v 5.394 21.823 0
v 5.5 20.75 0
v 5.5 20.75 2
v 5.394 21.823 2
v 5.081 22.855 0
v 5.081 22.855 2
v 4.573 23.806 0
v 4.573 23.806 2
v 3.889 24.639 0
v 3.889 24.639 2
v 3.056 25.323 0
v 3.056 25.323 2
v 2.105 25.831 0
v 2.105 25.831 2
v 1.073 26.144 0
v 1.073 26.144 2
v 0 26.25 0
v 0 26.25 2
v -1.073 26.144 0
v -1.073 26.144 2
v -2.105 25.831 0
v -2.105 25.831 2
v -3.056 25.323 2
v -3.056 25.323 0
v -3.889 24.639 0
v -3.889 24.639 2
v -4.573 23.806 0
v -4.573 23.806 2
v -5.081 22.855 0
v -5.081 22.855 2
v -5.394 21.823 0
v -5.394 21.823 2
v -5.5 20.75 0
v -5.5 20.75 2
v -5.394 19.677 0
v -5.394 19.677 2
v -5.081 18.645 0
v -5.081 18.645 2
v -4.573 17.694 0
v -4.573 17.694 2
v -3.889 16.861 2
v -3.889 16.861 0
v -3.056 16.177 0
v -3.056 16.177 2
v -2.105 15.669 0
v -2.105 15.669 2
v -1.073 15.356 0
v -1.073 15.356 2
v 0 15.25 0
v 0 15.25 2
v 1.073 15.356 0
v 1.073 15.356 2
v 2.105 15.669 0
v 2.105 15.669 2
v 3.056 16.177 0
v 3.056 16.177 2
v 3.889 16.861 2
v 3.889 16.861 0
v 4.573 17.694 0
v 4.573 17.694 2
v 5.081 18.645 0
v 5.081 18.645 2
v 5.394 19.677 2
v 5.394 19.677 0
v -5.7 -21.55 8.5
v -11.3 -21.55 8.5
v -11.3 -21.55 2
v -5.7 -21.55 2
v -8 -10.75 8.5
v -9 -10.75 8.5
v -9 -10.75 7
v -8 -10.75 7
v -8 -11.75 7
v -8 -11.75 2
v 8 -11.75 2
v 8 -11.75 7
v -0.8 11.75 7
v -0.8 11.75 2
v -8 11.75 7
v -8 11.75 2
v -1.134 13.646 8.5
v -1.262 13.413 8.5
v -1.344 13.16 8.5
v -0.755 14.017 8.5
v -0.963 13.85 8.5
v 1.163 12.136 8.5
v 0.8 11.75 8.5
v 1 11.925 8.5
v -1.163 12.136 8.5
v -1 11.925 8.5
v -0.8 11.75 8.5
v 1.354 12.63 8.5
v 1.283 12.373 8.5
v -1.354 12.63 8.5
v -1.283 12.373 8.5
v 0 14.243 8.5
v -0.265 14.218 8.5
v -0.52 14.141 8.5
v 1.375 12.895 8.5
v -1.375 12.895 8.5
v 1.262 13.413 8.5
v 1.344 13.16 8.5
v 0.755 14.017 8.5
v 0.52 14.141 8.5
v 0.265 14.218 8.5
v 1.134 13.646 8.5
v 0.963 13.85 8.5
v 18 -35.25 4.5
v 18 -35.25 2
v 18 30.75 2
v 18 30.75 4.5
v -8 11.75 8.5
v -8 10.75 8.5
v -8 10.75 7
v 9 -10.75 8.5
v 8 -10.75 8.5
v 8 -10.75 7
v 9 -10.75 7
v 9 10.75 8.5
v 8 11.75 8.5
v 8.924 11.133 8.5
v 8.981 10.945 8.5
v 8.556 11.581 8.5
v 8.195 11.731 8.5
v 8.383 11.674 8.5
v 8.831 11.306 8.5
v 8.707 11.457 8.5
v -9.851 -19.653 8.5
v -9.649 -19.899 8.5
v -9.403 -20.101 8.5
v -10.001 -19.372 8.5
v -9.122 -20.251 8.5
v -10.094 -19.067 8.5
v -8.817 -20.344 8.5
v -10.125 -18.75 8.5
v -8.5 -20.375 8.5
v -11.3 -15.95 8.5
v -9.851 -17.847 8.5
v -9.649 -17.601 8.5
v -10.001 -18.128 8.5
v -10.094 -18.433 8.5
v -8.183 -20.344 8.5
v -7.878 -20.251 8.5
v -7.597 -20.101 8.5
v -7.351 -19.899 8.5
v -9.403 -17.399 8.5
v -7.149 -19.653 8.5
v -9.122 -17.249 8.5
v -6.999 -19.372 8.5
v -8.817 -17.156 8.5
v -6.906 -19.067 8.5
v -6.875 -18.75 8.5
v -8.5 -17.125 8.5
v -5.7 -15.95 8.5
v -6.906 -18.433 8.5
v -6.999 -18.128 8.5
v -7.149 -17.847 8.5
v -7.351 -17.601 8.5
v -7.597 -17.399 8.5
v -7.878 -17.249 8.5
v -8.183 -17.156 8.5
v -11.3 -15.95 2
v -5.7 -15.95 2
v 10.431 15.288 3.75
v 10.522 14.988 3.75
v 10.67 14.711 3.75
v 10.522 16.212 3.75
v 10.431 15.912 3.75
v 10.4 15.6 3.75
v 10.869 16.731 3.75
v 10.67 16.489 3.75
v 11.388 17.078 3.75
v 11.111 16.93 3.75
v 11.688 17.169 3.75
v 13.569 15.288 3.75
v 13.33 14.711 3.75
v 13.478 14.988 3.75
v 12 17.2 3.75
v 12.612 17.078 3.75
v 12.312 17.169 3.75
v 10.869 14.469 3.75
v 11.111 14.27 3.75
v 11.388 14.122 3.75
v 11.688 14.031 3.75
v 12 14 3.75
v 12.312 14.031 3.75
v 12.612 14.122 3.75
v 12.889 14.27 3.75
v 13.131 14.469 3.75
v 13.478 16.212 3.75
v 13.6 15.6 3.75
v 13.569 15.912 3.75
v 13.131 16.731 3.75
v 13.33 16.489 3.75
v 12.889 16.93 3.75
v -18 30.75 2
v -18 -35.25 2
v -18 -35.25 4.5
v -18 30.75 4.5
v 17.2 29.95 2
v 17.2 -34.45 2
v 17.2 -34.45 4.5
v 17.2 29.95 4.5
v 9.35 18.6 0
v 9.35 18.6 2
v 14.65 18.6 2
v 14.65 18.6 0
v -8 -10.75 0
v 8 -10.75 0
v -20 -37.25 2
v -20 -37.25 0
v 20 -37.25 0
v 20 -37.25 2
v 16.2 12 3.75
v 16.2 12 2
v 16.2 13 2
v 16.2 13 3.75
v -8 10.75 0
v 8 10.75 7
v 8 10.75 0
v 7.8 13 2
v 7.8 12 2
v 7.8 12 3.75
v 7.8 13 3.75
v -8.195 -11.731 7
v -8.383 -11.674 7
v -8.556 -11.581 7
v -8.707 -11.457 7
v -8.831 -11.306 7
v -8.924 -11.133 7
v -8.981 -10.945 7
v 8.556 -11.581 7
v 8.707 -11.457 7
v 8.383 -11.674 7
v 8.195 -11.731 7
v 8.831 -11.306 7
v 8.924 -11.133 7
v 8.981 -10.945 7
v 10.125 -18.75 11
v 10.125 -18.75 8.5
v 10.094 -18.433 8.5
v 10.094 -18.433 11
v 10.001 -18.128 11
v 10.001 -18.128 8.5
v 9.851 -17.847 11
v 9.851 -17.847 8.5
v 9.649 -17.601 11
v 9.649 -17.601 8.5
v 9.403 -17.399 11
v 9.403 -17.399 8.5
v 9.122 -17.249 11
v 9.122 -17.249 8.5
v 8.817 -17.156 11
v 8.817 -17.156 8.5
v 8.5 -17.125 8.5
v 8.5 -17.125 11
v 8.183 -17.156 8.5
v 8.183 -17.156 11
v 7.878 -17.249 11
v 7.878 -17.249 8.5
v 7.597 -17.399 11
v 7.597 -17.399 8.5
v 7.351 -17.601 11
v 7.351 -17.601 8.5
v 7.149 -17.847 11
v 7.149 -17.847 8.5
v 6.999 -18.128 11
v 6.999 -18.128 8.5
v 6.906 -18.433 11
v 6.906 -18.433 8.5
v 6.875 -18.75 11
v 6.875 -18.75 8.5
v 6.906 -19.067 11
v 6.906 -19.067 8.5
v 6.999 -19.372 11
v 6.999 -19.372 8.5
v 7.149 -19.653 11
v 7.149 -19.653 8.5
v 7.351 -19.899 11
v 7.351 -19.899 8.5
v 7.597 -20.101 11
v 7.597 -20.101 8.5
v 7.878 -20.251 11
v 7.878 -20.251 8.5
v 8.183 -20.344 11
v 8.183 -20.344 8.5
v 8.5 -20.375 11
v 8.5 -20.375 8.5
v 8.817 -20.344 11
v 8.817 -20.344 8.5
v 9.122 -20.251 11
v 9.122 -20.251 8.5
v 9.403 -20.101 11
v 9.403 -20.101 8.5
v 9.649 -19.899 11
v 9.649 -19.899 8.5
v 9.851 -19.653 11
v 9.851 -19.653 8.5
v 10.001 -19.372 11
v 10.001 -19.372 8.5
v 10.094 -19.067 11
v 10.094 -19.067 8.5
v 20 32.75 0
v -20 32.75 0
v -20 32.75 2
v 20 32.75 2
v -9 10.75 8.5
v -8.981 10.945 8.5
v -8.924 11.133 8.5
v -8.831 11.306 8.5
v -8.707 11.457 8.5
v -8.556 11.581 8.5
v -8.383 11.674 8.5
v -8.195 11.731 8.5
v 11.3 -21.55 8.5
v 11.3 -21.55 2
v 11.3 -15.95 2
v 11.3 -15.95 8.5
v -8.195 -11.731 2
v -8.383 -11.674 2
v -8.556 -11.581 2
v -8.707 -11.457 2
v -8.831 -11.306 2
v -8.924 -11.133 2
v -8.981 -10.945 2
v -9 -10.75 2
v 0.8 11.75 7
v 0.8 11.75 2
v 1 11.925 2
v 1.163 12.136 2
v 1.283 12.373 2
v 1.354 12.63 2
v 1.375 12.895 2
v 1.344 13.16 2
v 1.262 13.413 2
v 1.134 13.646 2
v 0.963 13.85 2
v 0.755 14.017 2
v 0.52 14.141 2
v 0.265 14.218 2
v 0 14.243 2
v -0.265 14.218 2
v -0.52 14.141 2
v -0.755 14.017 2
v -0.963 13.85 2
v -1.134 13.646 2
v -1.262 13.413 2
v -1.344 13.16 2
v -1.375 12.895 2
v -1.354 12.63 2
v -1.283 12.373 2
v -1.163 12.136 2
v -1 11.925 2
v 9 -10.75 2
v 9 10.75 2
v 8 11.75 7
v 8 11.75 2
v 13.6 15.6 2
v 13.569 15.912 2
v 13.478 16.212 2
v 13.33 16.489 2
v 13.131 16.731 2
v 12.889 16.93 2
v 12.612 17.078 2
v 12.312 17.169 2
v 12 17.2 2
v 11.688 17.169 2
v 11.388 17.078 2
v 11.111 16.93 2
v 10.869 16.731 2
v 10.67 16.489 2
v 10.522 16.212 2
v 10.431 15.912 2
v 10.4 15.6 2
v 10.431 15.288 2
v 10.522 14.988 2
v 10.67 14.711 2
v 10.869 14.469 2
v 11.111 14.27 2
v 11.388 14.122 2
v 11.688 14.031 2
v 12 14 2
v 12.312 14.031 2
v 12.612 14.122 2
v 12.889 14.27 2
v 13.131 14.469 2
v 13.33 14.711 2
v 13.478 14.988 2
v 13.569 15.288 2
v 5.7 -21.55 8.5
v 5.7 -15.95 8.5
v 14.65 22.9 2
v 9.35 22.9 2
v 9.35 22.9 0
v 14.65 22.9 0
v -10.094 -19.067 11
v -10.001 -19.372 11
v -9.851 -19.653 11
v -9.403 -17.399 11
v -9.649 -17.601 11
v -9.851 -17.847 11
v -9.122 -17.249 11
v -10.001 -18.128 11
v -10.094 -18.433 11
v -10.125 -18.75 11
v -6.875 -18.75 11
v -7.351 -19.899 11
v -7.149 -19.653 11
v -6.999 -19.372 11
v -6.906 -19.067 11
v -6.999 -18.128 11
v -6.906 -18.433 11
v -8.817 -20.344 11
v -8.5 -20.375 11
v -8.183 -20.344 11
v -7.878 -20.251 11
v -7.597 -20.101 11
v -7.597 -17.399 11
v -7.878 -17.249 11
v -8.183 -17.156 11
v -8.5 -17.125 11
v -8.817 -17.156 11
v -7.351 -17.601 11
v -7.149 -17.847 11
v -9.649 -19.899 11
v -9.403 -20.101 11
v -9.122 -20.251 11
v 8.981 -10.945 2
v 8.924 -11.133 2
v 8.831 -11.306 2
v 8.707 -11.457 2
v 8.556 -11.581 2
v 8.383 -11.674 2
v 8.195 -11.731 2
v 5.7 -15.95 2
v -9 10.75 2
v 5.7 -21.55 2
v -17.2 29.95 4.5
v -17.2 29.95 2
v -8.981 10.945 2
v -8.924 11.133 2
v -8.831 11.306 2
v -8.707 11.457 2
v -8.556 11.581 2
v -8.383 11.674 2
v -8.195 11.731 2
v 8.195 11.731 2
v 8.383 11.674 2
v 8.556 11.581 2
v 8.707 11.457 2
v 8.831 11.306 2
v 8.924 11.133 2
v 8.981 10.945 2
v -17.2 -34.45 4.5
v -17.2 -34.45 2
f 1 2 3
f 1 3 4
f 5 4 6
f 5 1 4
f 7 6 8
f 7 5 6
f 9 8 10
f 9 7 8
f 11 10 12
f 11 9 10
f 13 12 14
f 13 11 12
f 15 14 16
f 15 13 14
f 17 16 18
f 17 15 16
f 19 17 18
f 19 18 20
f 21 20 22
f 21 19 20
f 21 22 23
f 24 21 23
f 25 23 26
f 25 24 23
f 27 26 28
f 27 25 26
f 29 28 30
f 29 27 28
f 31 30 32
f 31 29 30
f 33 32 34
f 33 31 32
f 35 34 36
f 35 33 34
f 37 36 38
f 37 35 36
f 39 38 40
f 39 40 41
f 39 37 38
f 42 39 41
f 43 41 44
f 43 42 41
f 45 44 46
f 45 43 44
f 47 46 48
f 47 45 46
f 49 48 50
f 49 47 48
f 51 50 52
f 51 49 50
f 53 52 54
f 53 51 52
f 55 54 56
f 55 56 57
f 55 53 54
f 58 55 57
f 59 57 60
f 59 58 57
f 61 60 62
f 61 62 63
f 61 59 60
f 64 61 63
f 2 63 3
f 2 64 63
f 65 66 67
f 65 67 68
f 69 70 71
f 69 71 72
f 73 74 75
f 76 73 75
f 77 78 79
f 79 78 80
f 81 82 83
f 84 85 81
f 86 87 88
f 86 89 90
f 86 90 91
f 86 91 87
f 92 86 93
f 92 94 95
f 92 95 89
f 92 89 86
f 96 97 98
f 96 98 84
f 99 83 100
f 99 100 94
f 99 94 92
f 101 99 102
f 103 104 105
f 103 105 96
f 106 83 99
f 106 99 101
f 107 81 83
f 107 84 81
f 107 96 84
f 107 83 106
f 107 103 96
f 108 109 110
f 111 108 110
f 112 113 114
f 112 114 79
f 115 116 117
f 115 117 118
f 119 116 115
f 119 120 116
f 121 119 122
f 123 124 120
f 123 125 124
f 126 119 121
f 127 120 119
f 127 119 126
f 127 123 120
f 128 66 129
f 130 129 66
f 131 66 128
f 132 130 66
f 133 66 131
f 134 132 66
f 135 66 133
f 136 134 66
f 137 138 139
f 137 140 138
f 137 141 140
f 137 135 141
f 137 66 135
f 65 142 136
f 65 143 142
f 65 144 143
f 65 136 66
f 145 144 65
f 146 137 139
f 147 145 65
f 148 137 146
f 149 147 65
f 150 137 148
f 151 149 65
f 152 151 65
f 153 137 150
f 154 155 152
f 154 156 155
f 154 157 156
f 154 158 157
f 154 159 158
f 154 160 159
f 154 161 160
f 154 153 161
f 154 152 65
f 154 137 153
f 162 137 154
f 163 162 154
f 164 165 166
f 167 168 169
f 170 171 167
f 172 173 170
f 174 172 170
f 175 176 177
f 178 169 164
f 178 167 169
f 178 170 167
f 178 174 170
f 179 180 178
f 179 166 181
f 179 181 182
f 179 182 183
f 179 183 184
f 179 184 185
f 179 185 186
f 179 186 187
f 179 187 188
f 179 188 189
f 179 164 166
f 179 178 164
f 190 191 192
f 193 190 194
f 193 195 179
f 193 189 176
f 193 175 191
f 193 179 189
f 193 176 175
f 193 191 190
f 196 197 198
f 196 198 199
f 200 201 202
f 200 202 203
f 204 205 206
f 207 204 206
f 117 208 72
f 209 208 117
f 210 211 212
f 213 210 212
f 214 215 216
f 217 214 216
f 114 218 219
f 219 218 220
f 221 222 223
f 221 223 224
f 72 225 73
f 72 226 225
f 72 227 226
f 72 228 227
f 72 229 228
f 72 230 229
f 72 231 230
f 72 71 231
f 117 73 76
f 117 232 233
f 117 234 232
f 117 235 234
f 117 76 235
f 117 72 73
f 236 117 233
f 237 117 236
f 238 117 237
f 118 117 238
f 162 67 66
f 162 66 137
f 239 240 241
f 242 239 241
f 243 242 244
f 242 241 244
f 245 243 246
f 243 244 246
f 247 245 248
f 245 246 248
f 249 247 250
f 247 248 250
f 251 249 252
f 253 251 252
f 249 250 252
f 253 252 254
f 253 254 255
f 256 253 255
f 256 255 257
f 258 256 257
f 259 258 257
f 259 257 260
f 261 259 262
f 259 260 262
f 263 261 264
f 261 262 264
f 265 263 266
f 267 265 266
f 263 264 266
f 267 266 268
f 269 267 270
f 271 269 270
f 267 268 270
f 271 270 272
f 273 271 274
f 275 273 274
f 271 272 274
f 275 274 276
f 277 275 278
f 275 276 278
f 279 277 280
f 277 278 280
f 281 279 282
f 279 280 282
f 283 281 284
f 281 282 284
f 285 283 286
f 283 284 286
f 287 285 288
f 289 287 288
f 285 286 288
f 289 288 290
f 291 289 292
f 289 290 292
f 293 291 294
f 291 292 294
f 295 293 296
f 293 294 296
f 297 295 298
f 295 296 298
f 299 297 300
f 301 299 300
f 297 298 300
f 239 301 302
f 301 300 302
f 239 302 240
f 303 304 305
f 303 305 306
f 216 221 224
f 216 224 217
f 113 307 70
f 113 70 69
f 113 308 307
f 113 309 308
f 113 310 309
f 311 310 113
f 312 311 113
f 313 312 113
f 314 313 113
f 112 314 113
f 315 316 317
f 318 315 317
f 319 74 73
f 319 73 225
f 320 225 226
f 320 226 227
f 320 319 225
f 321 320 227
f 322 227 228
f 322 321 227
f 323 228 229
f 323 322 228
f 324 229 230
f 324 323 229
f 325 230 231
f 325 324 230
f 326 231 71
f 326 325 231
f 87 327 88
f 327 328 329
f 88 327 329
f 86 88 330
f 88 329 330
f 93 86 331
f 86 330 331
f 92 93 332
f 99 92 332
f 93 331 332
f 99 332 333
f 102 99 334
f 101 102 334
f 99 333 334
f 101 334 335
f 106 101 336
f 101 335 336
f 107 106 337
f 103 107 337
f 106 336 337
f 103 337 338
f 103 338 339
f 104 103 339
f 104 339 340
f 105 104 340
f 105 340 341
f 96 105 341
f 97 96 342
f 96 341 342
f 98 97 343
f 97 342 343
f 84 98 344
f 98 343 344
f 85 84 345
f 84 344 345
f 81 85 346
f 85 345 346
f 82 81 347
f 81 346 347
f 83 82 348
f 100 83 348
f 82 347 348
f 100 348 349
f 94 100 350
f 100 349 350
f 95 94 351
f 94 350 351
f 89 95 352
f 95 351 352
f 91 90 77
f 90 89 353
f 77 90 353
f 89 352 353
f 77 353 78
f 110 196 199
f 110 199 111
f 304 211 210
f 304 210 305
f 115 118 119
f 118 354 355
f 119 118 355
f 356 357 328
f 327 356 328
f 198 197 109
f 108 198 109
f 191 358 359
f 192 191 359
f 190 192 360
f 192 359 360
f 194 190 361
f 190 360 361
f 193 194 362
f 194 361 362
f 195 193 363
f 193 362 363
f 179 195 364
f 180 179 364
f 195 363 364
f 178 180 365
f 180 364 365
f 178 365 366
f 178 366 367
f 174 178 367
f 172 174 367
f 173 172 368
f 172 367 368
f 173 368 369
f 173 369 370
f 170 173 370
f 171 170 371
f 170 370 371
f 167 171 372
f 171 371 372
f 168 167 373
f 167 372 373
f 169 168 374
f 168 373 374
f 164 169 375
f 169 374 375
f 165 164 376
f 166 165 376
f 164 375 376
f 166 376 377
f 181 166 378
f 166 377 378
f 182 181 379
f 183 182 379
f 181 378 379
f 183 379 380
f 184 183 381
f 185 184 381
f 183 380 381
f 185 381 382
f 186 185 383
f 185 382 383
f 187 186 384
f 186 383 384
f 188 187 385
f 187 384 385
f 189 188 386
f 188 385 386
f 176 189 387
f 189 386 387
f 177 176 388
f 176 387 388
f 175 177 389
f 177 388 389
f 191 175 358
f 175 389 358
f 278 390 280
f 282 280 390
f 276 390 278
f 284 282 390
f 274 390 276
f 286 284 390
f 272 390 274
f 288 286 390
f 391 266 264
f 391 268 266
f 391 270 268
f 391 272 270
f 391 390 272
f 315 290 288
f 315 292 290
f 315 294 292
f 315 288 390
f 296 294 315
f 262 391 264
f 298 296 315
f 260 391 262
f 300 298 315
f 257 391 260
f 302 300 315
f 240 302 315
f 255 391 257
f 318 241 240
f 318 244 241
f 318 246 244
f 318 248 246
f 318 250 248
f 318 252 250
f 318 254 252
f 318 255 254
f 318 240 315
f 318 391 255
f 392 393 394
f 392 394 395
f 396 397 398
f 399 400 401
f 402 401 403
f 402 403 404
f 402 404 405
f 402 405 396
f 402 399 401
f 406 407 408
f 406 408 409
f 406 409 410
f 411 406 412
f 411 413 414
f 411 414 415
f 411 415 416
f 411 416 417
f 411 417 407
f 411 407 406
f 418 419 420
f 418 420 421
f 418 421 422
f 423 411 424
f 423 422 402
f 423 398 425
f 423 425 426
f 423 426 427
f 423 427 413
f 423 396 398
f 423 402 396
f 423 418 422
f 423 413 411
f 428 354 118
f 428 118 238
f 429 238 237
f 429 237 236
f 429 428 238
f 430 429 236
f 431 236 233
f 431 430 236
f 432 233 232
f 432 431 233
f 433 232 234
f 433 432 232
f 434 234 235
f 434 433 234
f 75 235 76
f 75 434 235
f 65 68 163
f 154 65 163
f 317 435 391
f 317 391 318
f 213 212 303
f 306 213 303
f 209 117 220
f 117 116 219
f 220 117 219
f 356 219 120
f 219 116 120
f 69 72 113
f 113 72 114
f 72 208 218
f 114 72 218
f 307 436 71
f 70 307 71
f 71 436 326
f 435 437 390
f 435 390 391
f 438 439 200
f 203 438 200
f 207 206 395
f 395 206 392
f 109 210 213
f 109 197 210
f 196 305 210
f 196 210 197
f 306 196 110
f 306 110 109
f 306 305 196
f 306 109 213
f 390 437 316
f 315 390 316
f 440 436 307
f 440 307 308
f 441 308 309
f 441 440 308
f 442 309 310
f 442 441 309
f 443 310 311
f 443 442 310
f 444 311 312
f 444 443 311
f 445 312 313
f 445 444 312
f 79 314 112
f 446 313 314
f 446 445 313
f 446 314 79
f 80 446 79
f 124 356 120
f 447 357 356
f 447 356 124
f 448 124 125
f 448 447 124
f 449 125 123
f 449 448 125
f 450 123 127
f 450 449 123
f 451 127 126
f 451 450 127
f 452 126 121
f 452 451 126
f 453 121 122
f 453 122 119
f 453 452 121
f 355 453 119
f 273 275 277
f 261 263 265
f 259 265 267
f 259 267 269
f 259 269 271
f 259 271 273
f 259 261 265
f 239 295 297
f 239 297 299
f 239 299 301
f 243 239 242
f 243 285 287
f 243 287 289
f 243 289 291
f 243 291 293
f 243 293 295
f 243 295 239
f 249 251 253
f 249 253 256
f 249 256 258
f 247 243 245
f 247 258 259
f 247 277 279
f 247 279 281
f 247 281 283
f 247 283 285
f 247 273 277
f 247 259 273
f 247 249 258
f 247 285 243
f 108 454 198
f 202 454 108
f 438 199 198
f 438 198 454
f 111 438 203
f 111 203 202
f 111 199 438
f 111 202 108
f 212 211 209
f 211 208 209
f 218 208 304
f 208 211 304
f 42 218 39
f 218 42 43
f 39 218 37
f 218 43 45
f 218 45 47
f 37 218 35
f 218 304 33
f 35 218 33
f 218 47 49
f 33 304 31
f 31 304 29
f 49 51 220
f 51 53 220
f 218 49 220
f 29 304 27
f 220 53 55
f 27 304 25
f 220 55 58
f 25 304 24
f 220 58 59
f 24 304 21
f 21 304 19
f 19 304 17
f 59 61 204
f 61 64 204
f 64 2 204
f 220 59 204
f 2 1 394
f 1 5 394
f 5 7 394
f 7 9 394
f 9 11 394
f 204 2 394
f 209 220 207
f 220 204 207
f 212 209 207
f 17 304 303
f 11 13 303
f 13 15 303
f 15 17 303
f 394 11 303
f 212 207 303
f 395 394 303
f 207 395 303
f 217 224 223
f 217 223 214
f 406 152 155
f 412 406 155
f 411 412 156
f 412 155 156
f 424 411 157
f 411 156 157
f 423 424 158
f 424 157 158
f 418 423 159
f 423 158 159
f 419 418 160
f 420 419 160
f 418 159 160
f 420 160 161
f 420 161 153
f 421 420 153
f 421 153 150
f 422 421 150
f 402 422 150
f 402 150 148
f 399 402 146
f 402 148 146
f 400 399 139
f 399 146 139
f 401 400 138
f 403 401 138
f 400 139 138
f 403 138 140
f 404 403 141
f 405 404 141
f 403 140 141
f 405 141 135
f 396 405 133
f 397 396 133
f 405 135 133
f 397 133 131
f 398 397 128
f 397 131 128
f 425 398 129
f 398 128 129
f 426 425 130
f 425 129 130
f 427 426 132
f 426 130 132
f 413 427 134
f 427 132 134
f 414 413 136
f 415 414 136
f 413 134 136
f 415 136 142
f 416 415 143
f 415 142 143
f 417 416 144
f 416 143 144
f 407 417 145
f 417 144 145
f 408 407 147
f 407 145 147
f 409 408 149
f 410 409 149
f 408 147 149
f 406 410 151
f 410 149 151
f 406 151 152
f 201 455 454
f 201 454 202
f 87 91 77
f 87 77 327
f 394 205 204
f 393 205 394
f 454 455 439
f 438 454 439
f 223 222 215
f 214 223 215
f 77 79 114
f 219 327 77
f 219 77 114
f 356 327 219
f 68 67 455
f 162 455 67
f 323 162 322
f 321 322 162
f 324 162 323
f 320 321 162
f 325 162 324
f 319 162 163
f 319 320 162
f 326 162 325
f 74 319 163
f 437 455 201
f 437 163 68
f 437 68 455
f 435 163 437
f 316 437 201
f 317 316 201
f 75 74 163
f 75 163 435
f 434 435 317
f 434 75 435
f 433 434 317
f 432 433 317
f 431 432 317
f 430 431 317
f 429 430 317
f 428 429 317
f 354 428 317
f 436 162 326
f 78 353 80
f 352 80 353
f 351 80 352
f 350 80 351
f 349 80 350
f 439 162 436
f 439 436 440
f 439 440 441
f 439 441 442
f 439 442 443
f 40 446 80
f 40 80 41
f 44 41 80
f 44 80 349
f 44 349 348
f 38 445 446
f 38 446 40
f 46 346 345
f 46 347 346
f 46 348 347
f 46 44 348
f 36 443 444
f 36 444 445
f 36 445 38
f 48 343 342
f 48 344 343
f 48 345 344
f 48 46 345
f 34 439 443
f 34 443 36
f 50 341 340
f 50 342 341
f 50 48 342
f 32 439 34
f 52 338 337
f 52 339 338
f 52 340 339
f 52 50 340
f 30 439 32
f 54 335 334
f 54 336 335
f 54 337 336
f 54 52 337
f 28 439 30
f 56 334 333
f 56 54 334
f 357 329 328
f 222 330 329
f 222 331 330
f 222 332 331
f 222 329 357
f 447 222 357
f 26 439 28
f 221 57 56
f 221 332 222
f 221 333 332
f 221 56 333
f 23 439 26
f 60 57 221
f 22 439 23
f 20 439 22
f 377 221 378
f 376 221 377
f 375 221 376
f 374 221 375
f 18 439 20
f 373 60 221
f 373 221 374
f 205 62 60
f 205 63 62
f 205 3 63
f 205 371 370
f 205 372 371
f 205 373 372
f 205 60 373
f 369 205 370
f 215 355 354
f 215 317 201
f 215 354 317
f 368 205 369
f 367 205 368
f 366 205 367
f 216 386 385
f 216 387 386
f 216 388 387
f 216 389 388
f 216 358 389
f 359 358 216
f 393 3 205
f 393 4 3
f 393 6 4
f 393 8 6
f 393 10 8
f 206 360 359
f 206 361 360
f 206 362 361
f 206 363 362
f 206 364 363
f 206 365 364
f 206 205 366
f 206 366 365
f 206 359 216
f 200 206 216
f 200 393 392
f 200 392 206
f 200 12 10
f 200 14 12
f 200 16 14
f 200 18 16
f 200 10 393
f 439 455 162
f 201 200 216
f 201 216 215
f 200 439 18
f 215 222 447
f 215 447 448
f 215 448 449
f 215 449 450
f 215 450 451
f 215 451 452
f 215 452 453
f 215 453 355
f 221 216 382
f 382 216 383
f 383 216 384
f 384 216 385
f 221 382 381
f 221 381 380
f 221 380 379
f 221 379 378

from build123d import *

# Parameters (mm, degrees)
SKETCH_W        = 40
SKETCH_H        = 70
SKETCH_R        = 5.5
SKETCH_W_2      = 16
SKETCH_H_2      = 21.5
PAD_DEPTH       = 2
SKETCH001_W     = 5.6
SKETCH001_H     = 5.6
SKETCH001_W_2   = 16
SKETCH001_H_2   = 21.5
PAD001_DEPTH    = 6.5
SKETCH002_R     = 1.625
PAD002_DEPTH    = 2.5
SKETCH003_W     = 16.000008
SKETCH003_H     = 1
SKETCH003_W_2   = 18
POCKET_DEPTH    = 1.5
SKETCH004_W     = 5.3
SKETCH004_H     = 4.3
POCKET001_DEPTH = 2.001
SKETCH005_R     = 1.6
SKETCH005_W     = 8.4
SKETCH005_H     = 1
PAD003_DEPTH    = 1.75
SKETCH006_W     = 36
SKETCH006_H     = 66
SKETCH006_W_2   = 34.4
SKETCH006_H_2   = 64.4
PAD004_DEPTH    = 2.5


with BuildPart() as part:
    # Sketch → Pad (new body)
    with BuildSketch(Plane.XY):
        with Locations((0, -2.25)):
            Rectangle(SKETCH_W, SKETCH_H)
        with Locations((0, 20.75)):
            Circle(SKETCH_R, mode=Mode.SUBTRACT)
        Rectangle(SKETCH_W_2, SKETCH_H_2, mode=Mode.SUBTRACT)
    extrude(amount=PAD_DEPTH)

    # Sketch001 (on Face11 of Pad) → Pad001 (join)
    with BuildSketch(Plane.XY.offset(2)):
        with Locations((-8.5, -18.75)):
            Rectangle(SKETCH001_W, SKETCH001_H)
        with Locations((8.5, -18.75)):
            Rectangle(SKETCH001_W, SKETCH001_H)
        with BuildLine():
            Line((-8, -11.75), (8, -11.75))
            ThreePointArc((9, -10.75), (8.707107, -11.457107), (8, -11.75))
            Line((9, -10.75), (9, 10.75))
            ThreePointArc((8, 11.75), (8.707107, 11.457107), (9, 10.75))
            Line((8, 11.75), (0.8, 11.75))
            ThreePointArc((0.8, 11.75), (0, 14.243313), (-0.8, 11.75))
            Line((-0.8, 11.75), (-8.000008, 11.75))
            ThreePointArc((-9, 10.75), (-8.707109, 11.457104), (-8.000008, 11.75))
            Line((-9, 10.75), (-9, -10.75))
            ThreePointArc((-8, -11.75), (-8.707107, -11.457107), (-9, -10.75))
        make_face()
        Rectangle(SKETCH001_W_2, SKETCH001_H_2, mode=Mode.SUBTRACT)
    extrude(amount=PAD001_DEPTH)

    # Sketch002 (on Face34 of Pad001) → Pad002 (join)
    with BuildSketch(Plane.XY.offset(8.5)):
        with Locations((-8.5, -18.75)):
            Circle(SKETCH002_R)
        with Locations((8.5, -18.75)):
            Circle(SKETCH002_R)
    extrude(amount=PAD002_DEPTH)

    # Sketch003 (on Face35 of Pad002) → Pocket (cut)
    with BuildSketch(Plane.XY.offset(8.5)):
        with Locations((-4e-06, 11.25)):
            Rectangle(SKETCH003_W, SKETCH003_H)
        with Locations((0, -11.25)):
            Rectangle(SKETCH003_W_2, SKETCH003_H)
    extrude(amount=-POCKET_DEPTH, mode=Mode.SUBTRACT)

    # Sketch004 (on Face5 of Pocket) → Pocket001 (cut, through all)
    with BuildSketch(Plane.XY.offset(2)):
        with Locations((12, 20.75)):
            Rectangle(SKETCH004_W, SKETCH004_H)
    extrude(amount=-POCKET001_DEPTH, mode=Mode.SUBTRACT)

    # Sketch005 (on Face5 of Pocket001) → Pad003 (join)
    with BuildSketch(Plane.XY.offset(2)):
        with Locations((12, 15.6)):
            Circle(SKETCH005_R)
        with Locations((12, 12.5)):
            Rectangle(SKETCH005_W, SKETCH005_H)
    extrude(amount=PAD003_DEPTH)

    # Sketch006 (on Face5 of Pad003) → Pad004 (join)
    with BuildSketch(Plane.XY.offset(2)):
        with Locations((0, -2.25)):
            Rectangle(SKETCH006_W, SKETCH006_H)
        with Locations((0, -2.25)):
            Rectangle(SKETCH006_W_2, SKETCH006_H_2, mode=Mode.SUBTRACT)
    extrude(amount=PAD004_DEPTH)


solid = part.part
